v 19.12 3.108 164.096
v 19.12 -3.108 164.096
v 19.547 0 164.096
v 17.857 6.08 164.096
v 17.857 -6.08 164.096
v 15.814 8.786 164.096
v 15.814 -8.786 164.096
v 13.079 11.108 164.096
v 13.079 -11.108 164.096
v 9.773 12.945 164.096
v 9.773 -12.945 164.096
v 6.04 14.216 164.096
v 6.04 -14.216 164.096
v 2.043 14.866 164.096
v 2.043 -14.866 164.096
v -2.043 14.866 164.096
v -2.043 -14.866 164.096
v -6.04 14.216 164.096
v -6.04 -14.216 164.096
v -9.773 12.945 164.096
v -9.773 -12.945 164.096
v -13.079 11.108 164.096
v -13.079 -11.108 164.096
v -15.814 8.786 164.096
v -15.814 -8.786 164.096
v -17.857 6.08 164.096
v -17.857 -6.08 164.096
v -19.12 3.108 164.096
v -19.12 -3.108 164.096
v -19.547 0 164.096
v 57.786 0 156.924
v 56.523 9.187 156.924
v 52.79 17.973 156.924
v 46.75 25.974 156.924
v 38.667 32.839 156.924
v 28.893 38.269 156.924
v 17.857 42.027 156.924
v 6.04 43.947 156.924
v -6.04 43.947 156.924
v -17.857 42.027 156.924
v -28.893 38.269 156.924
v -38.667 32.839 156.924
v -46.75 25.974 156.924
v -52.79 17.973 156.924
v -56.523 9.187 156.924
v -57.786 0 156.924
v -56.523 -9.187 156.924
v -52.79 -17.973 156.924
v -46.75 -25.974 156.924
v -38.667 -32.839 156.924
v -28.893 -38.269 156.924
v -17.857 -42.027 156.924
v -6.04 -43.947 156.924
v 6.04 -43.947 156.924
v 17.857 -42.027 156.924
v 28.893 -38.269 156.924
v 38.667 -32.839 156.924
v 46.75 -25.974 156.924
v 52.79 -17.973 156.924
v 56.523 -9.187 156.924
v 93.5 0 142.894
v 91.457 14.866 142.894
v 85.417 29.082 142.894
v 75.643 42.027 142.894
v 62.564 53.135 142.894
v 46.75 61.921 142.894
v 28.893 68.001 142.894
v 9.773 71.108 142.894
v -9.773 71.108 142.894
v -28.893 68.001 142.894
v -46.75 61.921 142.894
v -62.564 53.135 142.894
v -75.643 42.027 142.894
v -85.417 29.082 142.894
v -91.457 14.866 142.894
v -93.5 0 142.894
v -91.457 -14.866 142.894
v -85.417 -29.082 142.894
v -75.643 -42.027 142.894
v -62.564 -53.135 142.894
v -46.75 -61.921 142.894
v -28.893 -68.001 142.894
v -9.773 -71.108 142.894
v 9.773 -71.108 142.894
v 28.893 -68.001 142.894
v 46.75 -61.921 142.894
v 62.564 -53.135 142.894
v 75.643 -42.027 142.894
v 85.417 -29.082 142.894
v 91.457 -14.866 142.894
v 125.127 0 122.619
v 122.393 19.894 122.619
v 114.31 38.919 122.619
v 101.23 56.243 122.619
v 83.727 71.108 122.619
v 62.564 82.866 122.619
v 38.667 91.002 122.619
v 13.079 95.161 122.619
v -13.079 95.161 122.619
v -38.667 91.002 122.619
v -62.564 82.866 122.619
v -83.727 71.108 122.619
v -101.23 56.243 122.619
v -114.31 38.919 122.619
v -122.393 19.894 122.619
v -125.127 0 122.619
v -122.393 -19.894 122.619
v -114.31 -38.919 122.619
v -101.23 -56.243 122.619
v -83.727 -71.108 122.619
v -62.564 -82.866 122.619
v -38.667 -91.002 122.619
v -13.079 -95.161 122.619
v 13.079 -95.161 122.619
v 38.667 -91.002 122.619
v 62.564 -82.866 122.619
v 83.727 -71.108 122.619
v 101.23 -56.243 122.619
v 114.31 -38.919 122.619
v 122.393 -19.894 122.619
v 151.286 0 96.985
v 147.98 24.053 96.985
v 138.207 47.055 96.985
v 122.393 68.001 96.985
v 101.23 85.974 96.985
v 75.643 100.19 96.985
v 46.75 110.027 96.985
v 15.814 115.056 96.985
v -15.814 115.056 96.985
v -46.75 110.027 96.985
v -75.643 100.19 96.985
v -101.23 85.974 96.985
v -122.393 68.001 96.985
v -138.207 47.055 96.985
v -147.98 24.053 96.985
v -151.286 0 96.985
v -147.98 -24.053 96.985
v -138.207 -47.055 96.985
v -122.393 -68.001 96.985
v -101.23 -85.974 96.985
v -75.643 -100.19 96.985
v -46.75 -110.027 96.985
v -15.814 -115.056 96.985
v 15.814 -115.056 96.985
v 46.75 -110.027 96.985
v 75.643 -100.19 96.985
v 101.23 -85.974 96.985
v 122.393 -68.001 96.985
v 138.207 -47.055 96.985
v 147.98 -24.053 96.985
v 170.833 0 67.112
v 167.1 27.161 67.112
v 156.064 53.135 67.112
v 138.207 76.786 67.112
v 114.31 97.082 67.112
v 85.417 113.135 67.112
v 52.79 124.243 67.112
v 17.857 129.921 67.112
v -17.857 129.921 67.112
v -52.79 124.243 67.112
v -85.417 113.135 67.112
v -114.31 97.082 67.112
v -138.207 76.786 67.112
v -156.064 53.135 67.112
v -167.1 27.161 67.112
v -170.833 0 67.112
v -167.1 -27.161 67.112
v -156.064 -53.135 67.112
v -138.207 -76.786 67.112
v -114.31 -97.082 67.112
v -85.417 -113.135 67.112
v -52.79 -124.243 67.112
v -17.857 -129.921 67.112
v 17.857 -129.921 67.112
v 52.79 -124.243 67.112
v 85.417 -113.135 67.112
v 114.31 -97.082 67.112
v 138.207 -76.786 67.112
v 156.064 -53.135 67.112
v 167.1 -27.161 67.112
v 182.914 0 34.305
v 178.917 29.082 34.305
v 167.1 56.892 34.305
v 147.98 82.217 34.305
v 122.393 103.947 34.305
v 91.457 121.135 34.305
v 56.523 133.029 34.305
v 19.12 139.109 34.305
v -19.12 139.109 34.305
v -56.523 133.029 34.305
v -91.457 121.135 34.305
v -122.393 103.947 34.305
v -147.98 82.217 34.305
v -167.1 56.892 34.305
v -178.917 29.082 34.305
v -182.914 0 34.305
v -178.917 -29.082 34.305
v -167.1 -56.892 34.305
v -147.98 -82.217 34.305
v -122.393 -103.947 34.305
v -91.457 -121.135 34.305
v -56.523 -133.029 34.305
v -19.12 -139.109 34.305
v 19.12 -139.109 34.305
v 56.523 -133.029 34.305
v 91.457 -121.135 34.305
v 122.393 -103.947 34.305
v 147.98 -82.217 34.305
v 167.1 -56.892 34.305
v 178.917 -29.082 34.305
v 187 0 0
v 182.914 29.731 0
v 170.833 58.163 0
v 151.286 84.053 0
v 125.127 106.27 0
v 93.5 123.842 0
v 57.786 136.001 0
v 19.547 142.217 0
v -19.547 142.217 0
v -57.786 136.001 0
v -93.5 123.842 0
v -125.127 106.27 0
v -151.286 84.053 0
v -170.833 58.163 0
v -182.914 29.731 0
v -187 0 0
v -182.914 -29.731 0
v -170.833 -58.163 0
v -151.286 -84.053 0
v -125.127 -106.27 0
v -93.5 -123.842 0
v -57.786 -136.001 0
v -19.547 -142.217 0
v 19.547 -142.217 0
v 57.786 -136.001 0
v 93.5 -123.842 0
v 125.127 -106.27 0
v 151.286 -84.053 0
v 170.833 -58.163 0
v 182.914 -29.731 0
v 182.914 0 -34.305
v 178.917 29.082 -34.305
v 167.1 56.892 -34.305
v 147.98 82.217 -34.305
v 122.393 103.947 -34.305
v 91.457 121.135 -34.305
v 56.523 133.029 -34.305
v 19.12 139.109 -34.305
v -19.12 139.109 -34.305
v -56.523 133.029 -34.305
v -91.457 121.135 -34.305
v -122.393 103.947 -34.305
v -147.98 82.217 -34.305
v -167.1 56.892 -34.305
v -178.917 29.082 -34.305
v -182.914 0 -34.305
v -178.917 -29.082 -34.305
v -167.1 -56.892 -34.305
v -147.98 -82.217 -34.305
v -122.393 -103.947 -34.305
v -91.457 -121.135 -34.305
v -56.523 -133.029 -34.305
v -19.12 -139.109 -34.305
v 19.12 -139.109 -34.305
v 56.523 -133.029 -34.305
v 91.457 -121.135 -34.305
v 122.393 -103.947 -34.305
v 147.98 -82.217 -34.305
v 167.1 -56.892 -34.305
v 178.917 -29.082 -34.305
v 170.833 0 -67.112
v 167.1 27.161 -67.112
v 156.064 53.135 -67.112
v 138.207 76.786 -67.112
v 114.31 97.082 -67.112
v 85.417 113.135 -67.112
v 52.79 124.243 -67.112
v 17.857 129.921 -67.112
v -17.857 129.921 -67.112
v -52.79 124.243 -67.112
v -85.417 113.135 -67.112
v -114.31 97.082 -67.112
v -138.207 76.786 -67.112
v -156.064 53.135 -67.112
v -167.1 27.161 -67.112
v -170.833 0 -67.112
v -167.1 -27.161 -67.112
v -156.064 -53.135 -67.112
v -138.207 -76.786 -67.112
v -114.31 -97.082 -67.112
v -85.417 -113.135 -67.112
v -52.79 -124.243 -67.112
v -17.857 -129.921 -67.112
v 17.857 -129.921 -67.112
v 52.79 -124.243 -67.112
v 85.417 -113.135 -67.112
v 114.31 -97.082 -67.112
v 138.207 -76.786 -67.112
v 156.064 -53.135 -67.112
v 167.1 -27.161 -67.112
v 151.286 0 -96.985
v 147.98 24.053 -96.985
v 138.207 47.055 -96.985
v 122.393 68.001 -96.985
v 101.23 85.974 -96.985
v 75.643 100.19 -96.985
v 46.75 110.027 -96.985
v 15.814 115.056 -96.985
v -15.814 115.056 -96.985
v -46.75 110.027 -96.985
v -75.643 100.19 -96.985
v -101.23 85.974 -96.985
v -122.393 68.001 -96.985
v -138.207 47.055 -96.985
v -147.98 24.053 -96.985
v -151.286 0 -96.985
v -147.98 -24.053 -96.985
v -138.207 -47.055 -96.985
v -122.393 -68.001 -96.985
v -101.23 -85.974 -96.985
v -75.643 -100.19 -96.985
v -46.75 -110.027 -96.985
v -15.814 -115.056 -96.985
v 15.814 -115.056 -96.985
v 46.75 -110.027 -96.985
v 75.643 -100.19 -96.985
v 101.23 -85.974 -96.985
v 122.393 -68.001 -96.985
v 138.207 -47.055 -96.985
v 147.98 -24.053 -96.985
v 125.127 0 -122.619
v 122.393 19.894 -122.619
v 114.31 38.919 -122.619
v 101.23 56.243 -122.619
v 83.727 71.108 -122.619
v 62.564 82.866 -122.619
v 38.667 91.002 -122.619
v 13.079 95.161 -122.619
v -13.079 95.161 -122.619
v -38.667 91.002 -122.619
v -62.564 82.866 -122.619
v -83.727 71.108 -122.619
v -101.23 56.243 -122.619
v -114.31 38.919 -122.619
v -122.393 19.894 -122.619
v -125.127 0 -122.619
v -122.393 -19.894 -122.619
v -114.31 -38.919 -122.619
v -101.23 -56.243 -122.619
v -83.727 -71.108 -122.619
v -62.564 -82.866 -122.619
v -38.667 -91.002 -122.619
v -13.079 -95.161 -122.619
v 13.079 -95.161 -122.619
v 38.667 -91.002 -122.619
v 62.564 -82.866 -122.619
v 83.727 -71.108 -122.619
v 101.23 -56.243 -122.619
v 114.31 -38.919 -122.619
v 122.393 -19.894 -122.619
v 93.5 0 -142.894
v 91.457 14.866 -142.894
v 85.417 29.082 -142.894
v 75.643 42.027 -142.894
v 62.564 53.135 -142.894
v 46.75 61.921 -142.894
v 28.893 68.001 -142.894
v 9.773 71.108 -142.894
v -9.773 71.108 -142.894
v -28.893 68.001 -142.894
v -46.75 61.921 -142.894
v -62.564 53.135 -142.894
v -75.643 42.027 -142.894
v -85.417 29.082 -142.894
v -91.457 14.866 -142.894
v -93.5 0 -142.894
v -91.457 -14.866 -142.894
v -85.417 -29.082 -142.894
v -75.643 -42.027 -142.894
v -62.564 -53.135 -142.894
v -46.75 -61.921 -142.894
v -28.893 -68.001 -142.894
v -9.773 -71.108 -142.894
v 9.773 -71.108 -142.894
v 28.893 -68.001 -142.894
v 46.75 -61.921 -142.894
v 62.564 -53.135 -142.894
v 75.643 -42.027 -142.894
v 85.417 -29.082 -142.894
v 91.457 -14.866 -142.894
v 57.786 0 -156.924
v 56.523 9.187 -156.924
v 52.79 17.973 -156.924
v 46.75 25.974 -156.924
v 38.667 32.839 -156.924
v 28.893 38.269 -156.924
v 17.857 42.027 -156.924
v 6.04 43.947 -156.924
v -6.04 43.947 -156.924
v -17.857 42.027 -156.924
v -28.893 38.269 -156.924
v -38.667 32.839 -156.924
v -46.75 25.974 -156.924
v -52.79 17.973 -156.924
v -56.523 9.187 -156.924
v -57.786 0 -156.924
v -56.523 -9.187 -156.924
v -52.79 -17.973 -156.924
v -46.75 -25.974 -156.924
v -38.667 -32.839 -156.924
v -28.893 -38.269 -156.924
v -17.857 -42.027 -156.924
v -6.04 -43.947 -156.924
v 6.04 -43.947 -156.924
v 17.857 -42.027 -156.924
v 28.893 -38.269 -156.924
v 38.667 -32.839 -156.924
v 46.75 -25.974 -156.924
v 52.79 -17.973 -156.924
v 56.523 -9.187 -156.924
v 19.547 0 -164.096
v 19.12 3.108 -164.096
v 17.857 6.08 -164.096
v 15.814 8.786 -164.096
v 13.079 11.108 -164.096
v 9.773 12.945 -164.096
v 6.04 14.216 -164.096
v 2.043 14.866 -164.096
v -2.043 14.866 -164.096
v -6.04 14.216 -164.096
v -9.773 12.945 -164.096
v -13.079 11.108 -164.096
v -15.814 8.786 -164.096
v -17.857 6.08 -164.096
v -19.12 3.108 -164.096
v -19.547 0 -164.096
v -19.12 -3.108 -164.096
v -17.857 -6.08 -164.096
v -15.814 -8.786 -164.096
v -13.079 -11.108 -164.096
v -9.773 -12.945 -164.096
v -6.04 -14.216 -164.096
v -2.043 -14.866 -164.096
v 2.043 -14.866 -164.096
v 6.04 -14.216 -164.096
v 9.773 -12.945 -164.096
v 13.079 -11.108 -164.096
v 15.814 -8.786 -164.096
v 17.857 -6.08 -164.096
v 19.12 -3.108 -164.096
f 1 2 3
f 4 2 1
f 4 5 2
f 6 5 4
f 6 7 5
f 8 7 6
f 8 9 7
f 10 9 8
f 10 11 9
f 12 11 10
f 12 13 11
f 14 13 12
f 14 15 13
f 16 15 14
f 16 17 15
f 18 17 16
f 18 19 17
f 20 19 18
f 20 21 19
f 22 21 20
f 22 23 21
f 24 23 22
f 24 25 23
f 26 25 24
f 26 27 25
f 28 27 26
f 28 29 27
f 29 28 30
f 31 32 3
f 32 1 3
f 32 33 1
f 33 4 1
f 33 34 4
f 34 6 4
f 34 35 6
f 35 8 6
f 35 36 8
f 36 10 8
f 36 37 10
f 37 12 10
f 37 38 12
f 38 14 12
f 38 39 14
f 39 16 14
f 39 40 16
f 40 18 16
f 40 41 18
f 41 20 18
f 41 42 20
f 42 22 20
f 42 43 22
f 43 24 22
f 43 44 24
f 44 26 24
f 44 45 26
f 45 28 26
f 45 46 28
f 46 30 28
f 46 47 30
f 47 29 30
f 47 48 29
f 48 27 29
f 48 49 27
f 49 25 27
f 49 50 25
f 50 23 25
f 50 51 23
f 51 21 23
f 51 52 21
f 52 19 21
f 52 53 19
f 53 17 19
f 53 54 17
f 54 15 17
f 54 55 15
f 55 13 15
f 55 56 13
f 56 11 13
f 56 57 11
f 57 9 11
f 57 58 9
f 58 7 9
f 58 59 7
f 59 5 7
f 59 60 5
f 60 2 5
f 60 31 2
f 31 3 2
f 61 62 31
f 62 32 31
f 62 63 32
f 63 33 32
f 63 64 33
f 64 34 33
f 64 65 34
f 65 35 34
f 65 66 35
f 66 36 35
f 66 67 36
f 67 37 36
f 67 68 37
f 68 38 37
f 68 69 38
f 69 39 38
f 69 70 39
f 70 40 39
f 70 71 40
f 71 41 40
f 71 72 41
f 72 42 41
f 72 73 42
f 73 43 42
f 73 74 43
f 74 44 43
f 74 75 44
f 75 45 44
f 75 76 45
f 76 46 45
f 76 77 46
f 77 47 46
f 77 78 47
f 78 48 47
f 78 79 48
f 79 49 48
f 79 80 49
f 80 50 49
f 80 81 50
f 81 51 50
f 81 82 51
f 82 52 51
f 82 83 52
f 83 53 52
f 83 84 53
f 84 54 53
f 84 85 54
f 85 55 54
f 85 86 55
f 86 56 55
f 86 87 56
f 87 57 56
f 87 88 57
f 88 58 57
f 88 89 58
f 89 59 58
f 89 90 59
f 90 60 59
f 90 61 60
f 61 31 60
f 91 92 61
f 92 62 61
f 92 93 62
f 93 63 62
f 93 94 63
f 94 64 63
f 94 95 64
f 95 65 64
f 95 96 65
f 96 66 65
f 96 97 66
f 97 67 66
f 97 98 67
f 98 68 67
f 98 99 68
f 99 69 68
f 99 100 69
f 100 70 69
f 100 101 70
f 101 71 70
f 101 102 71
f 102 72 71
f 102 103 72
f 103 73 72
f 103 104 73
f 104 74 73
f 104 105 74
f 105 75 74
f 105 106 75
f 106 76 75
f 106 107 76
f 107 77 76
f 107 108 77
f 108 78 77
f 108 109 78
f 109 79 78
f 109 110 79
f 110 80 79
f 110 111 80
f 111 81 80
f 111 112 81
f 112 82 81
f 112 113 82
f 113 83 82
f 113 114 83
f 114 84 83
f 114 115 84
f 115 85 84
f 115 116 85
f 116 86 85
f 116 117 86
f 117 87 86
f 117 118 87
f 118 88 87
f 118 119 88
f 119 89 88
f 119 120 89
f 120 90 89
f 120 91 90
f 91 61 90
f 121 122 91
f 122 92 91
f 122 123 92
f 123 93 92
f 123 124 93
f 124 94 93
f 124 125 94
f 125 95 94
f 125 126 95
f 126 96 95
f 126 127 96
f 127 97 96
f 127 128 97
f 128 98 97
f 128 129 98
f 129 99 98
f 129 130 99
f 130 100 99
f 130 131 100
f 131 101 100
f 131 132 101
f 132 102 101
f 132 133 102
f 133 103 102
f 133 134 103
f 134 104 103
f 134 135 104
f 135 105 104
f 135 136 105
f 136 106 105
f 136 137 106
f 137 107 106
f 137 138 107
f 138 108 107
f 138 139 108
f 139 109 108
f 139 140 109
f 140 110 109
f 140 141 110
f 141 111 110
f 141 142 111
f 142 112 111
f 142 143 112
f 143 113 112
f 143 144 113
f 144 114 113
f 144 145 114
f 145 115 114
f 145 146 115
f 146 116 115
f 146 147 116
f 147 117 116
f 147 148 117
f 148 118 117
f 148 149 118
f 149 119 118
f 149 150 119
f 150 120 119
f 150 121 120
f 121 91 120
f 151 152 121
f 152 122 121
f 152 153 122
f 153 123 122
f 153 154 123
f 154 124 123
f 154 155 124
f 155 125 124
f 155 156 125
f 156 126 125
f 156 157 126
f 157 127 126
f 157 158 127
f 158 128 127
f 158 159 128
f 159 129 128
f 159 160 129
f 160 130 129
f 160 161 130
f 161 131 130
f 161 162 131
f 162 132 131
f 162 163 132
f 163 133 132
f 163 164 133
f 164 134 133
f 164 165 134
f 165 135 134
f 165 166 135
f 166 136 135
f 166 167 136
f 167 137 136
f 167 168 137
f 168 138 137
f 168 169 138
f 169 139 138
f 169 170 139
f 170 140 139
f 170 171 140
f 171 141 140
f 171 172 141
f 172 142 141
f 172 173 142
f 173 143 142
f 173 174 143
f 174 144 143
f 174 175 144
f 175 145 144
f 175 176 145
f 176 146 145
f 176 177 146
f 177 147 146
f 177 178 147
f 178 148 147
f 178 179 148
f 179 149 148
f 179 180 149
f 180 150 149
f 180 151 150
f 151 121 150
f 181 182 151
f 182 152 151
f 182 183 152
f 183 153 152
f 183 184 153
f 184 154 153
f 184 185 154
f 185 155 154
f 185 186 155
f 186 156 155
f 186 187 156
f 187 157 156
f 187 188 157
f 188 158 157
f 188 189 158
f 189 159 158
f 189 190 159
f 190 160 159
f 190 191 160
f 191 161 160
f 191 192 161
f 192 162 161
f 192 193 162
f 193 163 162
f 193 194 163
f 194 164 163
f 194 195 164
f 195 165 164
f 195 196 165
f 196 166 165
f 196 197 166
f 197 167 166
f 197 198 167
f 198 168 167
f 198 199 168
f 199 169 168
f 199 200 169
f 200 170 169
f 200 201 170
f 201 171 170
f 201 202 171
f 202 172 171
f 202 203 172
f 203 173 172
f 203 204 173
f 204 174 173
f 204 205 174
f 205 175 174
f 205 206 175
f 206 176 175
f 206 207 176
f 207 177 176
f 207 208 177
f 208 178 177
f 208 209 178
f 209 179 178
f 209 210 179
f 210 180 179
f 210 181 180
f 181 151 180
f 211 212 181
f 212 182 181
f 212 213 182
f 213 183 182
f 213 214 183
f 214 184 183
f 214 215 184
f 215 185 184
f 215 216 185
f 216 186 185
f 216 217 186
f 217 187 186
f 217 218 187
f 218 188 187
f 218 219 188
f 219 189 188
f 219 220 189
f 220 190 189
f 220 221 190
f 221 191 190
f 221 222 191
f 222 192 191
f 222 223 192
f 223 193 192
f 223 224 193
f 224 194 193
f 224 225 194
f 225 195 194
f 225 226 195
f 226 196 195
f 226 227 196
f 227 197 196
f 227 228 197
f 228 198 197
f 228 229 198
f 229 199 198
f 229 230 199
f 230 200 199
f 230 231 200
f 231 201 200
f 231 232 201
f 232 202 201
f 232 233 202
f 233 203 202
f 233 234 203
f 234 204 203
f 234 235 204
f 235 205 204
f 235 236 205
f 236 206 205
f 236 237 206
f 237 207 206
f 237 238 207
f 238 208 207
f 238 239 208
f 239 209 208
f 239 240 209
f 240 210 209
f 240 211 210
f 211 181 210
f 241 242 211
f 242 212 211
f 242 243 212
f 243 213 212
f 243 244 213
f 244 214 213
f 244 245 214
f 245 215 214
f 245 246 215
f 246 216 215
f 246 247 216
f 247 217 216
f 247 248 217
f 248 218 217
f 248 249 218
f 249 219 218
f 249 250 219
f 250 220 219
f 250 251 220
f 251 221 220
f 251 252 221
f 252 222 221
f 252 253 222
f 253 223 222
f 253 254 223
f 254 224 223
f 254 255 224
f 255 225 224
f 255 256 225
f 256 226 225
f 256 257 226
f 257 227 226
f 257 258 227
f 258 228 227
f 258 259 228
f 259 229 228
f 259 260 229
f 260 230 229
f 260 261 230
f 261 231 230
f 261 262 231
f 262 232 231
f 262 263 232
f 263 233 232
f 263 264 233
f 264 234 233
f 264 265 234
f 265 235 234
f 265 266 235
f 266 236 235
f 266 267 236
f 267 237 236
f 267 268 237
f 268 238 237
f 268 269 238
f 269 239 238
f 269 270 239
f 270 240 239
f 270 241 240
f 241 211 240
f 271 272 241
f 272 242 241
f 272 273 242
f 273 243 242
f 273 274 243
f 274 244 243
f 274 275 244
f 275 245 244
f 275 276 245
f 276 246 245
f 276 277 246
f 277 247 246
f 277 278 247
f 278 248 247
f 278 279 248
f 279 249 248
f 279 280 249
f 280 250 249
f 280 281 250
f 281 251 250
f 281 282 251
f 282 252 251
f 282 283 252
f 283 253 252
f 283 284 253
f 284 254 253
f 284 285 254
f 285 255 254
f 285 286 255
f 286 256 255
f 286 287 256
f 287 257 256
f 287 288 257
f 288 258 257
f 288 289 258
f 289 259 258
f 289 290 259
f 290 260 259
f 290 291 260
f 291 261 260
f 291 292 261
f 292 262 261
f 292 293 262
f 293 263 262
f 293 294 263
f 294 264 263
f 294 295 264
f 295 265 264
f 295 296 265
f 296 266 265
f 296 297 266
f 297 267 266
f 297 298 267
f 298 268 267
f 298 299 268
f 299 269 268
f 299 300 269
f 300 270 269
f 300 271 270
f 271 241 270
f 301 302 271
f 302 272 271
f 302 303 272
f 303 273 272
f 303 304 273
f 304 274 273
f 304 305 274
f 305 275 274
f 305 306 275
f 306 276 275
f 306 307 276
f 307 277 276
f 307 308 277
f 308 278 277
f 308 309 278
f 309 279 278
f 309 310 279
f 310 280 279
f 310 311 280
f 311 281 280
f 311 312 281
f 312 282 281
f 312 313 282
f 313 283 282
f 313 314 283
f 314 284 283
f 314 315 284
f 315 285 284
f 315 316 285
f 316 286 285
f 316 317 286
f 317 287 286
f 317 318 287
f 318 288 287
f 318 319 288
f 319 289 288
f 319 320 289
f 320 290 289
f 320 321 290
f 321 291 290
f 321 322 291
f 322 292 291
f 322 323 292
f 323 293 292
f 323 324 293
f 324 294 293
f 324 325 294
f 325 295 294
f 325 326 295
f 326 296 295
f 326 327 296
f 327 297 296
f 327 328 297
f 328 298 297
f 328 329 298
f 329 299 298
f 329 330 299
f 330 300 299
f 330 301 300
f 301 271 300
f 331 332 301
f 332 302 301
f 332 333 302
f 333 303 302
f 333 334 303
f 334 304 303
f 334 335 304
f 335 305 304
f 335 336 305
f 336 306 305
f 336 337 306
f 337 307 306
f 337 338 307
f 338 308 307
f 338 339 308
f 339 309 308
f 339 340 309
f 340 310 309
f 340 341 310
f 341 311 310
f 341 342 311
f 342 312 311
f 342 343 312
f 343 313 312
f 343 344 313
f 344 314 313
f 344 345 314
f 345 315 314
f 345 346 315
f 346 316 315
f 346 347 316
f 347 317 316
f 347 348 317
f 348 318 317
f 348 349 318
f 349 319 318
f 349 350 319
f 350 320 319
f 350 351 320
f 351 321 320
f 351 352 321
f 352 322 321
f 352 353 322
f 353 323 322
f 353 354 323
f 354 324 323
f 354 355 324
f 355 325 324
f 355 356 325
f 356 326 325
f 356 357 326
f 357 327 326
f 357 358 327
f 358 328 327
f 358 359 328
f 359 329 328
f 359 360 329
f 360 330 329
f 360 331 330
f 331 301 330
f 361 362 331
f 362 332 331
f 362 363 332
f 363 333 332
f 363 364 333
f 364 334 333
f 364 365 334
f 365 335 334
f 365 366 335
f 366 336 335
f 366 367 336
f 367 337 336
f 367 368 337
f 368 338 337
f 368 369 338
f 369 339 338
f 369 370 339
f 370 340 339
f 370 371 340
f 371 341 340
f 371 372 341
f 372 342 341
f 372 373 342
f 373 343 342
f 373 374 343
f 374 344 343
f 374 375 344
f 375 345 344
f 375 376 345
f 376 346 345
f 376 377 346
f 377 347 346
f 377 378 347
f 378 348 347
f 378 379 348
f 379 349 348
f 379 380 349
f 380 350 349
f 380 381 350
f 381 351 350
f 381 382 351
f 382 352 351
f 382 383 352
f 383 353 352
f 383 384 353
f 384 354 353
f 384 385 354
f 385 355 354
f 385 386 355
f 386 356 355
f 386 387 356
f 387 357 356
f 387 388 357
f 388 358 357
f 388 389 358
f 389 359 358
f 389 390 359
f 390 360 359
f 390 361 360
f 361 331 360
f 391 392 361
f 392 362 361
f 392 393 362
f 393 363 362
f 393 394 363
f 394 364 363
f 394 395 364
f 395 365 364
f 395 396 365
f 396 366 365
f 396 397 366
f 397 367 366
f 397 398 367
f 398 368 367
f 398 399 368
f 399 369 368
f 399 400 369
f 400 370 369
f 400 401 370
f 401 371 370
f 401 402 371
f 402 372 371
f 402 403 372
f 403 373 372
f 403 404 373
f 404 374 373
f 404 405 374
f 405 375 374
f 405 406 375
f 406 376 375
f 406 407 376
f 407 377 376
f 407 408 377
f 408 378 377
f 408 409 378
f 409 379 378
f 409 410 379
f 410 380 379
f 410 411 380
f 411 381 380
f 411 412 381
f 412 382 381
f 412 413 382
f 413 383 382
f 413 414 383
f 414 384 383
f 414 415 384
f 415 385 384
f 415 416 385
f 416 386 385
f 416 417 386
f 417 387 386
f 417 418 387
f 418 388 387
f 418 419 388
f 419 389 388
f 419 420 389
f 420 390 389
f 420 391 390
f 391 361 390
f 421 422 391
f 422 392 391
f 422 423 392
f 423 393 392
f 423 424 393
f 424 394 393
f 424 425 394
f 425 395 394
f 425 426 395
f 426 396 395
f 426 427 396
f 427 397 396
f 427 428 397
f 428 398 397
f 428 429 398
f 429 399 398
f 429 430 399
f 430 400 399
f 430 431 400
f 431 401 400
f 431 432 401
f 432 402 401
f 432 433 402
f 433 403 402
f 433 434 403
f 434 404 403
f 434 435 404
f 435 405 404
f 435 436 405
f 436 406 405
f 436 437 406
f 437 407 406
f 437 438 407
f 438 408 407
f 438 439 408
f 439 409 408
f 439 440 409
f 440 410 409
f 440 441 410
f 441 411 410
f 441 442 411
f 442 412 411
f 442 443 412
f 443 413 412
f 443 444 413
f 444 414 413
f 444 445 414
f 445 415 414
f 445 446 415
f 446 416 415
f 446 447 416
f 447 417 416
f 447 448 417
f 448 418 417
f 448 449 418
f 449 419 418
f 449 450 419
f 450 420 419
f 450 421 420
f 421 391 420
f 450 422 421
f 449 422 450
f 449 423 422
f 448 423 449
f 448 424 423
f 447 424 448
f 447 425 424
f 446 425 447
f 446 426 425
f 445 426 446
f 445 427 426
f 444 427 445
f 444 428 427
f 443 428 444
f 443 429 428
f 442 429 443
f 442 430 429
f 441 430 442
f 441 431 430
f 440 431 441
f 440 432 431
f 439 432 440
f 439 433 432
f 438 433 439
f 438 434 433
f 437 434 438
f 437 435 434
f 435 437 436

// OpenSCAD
// Generated by SolidPython 1.0.1 on 2020-07-29 00:46:53


scale(v = [17, 13, 15]) {
	sphere(r = 11);
}
/***********************************************
*********      SolidPython code:      **********
************************************************
 
# import packages: SolidPython
from solid import *
from solid.utils import *
from itertools import chain, combinations, permutations


class Resize:

    def __init__(self, scad_file):
        self.scad_file = scad_file
        #self.scad_file = import_scad(scad_file)
        # cone/cylinder param:
        self.r1 = 0
        self.r2 = 0
        self.h = 0
        # rectangular prism param:
        self.w = 0
        self.l = 0
        # ellipse param:
        self.r = 0

    # import OpenScad code (file name corresponds to shape)


    # classify shape + parameters
    def assign(self, param1, param2, param3):
        if self.scad_file == 'cone.scad':
            self.r1 = param1
            self.r2 = param2
            self.h = param3
        elif self.scad_file == 'cylinder.scad':
            self.r1 = param1
            self.r2 = param2
            self.h = param3
        elif self.scad_file == 'rectangularPrism.scad':
            self.h = param1
            self.l = param2
            self.w = param3
        else:
            self.r = param1
            self.h = param2

    # resize parameters
    def iterate(self):
        x = range(3, 20, 2)
        i = 1
        if self.scad_file == 'cone.scad':
            tempList = list(permutations(x, 2))
            for temp in tempList:
                param1 = temp[0]
                param2 = temp[1]
                filepath = 'produced_scad_files/' + 'cone' + str(param1) + '_' + str(param2) + '_' + '.scad'
                scad_render_to_file(cylinder(h=param1, r1=param2, r2=0), filepath)

        elif self.scad_file == 'cylinder.scad':
            tempList = list(permutations(x, 3))
            for temp in tempList:
                param1 = temp[0]
                param2 = temp[1]
                filepath = 'produced_scad_files/' + 'cylinder' + str(param1) + '_' + str(param2) + '_' + '.scad'
                scad_render_to_file(cylinder(h=param1, r1=param2, r2=param2), filepath)

        elif self.scad_file == 'rectangularPrism.scad':
            tempList = list(permutations(x, 3))
            for temp in tempList:
                param1 = temp[0]
                param2 = temp[1]
                param3 = temp[2]
                filepath = 'produced_scad_files/' + 'rectangularPrism' + str(param1) + '_' + str(param2) + '_' + str(
                    param3) + '.scad'
                scad_render_to_file(cube(size=(param1, param2, param3)), filepath)

        elif self.scad_file == 'ellipse.scad':
            tempList = list(permutations(x, 4))
            for temp in tempList:
                param1 = temp[0]
                param2 = temp[1]
                param3 = temp[2]
                param4 = temp[3]
                filepath = 'produced_scad_files/' + 'ellipse' + str(param1) + '_' + str(param2) + '_' + str(param3) + '_' + str(param4) + '.scad'
                scad_render_to_file(scale([param1, param2, param3])(sphere(r=param4)), filepath)

    def render_to_scadfile(self):
        scad_render_to_file(scad, 'example.scad') 
 
************************************************/
